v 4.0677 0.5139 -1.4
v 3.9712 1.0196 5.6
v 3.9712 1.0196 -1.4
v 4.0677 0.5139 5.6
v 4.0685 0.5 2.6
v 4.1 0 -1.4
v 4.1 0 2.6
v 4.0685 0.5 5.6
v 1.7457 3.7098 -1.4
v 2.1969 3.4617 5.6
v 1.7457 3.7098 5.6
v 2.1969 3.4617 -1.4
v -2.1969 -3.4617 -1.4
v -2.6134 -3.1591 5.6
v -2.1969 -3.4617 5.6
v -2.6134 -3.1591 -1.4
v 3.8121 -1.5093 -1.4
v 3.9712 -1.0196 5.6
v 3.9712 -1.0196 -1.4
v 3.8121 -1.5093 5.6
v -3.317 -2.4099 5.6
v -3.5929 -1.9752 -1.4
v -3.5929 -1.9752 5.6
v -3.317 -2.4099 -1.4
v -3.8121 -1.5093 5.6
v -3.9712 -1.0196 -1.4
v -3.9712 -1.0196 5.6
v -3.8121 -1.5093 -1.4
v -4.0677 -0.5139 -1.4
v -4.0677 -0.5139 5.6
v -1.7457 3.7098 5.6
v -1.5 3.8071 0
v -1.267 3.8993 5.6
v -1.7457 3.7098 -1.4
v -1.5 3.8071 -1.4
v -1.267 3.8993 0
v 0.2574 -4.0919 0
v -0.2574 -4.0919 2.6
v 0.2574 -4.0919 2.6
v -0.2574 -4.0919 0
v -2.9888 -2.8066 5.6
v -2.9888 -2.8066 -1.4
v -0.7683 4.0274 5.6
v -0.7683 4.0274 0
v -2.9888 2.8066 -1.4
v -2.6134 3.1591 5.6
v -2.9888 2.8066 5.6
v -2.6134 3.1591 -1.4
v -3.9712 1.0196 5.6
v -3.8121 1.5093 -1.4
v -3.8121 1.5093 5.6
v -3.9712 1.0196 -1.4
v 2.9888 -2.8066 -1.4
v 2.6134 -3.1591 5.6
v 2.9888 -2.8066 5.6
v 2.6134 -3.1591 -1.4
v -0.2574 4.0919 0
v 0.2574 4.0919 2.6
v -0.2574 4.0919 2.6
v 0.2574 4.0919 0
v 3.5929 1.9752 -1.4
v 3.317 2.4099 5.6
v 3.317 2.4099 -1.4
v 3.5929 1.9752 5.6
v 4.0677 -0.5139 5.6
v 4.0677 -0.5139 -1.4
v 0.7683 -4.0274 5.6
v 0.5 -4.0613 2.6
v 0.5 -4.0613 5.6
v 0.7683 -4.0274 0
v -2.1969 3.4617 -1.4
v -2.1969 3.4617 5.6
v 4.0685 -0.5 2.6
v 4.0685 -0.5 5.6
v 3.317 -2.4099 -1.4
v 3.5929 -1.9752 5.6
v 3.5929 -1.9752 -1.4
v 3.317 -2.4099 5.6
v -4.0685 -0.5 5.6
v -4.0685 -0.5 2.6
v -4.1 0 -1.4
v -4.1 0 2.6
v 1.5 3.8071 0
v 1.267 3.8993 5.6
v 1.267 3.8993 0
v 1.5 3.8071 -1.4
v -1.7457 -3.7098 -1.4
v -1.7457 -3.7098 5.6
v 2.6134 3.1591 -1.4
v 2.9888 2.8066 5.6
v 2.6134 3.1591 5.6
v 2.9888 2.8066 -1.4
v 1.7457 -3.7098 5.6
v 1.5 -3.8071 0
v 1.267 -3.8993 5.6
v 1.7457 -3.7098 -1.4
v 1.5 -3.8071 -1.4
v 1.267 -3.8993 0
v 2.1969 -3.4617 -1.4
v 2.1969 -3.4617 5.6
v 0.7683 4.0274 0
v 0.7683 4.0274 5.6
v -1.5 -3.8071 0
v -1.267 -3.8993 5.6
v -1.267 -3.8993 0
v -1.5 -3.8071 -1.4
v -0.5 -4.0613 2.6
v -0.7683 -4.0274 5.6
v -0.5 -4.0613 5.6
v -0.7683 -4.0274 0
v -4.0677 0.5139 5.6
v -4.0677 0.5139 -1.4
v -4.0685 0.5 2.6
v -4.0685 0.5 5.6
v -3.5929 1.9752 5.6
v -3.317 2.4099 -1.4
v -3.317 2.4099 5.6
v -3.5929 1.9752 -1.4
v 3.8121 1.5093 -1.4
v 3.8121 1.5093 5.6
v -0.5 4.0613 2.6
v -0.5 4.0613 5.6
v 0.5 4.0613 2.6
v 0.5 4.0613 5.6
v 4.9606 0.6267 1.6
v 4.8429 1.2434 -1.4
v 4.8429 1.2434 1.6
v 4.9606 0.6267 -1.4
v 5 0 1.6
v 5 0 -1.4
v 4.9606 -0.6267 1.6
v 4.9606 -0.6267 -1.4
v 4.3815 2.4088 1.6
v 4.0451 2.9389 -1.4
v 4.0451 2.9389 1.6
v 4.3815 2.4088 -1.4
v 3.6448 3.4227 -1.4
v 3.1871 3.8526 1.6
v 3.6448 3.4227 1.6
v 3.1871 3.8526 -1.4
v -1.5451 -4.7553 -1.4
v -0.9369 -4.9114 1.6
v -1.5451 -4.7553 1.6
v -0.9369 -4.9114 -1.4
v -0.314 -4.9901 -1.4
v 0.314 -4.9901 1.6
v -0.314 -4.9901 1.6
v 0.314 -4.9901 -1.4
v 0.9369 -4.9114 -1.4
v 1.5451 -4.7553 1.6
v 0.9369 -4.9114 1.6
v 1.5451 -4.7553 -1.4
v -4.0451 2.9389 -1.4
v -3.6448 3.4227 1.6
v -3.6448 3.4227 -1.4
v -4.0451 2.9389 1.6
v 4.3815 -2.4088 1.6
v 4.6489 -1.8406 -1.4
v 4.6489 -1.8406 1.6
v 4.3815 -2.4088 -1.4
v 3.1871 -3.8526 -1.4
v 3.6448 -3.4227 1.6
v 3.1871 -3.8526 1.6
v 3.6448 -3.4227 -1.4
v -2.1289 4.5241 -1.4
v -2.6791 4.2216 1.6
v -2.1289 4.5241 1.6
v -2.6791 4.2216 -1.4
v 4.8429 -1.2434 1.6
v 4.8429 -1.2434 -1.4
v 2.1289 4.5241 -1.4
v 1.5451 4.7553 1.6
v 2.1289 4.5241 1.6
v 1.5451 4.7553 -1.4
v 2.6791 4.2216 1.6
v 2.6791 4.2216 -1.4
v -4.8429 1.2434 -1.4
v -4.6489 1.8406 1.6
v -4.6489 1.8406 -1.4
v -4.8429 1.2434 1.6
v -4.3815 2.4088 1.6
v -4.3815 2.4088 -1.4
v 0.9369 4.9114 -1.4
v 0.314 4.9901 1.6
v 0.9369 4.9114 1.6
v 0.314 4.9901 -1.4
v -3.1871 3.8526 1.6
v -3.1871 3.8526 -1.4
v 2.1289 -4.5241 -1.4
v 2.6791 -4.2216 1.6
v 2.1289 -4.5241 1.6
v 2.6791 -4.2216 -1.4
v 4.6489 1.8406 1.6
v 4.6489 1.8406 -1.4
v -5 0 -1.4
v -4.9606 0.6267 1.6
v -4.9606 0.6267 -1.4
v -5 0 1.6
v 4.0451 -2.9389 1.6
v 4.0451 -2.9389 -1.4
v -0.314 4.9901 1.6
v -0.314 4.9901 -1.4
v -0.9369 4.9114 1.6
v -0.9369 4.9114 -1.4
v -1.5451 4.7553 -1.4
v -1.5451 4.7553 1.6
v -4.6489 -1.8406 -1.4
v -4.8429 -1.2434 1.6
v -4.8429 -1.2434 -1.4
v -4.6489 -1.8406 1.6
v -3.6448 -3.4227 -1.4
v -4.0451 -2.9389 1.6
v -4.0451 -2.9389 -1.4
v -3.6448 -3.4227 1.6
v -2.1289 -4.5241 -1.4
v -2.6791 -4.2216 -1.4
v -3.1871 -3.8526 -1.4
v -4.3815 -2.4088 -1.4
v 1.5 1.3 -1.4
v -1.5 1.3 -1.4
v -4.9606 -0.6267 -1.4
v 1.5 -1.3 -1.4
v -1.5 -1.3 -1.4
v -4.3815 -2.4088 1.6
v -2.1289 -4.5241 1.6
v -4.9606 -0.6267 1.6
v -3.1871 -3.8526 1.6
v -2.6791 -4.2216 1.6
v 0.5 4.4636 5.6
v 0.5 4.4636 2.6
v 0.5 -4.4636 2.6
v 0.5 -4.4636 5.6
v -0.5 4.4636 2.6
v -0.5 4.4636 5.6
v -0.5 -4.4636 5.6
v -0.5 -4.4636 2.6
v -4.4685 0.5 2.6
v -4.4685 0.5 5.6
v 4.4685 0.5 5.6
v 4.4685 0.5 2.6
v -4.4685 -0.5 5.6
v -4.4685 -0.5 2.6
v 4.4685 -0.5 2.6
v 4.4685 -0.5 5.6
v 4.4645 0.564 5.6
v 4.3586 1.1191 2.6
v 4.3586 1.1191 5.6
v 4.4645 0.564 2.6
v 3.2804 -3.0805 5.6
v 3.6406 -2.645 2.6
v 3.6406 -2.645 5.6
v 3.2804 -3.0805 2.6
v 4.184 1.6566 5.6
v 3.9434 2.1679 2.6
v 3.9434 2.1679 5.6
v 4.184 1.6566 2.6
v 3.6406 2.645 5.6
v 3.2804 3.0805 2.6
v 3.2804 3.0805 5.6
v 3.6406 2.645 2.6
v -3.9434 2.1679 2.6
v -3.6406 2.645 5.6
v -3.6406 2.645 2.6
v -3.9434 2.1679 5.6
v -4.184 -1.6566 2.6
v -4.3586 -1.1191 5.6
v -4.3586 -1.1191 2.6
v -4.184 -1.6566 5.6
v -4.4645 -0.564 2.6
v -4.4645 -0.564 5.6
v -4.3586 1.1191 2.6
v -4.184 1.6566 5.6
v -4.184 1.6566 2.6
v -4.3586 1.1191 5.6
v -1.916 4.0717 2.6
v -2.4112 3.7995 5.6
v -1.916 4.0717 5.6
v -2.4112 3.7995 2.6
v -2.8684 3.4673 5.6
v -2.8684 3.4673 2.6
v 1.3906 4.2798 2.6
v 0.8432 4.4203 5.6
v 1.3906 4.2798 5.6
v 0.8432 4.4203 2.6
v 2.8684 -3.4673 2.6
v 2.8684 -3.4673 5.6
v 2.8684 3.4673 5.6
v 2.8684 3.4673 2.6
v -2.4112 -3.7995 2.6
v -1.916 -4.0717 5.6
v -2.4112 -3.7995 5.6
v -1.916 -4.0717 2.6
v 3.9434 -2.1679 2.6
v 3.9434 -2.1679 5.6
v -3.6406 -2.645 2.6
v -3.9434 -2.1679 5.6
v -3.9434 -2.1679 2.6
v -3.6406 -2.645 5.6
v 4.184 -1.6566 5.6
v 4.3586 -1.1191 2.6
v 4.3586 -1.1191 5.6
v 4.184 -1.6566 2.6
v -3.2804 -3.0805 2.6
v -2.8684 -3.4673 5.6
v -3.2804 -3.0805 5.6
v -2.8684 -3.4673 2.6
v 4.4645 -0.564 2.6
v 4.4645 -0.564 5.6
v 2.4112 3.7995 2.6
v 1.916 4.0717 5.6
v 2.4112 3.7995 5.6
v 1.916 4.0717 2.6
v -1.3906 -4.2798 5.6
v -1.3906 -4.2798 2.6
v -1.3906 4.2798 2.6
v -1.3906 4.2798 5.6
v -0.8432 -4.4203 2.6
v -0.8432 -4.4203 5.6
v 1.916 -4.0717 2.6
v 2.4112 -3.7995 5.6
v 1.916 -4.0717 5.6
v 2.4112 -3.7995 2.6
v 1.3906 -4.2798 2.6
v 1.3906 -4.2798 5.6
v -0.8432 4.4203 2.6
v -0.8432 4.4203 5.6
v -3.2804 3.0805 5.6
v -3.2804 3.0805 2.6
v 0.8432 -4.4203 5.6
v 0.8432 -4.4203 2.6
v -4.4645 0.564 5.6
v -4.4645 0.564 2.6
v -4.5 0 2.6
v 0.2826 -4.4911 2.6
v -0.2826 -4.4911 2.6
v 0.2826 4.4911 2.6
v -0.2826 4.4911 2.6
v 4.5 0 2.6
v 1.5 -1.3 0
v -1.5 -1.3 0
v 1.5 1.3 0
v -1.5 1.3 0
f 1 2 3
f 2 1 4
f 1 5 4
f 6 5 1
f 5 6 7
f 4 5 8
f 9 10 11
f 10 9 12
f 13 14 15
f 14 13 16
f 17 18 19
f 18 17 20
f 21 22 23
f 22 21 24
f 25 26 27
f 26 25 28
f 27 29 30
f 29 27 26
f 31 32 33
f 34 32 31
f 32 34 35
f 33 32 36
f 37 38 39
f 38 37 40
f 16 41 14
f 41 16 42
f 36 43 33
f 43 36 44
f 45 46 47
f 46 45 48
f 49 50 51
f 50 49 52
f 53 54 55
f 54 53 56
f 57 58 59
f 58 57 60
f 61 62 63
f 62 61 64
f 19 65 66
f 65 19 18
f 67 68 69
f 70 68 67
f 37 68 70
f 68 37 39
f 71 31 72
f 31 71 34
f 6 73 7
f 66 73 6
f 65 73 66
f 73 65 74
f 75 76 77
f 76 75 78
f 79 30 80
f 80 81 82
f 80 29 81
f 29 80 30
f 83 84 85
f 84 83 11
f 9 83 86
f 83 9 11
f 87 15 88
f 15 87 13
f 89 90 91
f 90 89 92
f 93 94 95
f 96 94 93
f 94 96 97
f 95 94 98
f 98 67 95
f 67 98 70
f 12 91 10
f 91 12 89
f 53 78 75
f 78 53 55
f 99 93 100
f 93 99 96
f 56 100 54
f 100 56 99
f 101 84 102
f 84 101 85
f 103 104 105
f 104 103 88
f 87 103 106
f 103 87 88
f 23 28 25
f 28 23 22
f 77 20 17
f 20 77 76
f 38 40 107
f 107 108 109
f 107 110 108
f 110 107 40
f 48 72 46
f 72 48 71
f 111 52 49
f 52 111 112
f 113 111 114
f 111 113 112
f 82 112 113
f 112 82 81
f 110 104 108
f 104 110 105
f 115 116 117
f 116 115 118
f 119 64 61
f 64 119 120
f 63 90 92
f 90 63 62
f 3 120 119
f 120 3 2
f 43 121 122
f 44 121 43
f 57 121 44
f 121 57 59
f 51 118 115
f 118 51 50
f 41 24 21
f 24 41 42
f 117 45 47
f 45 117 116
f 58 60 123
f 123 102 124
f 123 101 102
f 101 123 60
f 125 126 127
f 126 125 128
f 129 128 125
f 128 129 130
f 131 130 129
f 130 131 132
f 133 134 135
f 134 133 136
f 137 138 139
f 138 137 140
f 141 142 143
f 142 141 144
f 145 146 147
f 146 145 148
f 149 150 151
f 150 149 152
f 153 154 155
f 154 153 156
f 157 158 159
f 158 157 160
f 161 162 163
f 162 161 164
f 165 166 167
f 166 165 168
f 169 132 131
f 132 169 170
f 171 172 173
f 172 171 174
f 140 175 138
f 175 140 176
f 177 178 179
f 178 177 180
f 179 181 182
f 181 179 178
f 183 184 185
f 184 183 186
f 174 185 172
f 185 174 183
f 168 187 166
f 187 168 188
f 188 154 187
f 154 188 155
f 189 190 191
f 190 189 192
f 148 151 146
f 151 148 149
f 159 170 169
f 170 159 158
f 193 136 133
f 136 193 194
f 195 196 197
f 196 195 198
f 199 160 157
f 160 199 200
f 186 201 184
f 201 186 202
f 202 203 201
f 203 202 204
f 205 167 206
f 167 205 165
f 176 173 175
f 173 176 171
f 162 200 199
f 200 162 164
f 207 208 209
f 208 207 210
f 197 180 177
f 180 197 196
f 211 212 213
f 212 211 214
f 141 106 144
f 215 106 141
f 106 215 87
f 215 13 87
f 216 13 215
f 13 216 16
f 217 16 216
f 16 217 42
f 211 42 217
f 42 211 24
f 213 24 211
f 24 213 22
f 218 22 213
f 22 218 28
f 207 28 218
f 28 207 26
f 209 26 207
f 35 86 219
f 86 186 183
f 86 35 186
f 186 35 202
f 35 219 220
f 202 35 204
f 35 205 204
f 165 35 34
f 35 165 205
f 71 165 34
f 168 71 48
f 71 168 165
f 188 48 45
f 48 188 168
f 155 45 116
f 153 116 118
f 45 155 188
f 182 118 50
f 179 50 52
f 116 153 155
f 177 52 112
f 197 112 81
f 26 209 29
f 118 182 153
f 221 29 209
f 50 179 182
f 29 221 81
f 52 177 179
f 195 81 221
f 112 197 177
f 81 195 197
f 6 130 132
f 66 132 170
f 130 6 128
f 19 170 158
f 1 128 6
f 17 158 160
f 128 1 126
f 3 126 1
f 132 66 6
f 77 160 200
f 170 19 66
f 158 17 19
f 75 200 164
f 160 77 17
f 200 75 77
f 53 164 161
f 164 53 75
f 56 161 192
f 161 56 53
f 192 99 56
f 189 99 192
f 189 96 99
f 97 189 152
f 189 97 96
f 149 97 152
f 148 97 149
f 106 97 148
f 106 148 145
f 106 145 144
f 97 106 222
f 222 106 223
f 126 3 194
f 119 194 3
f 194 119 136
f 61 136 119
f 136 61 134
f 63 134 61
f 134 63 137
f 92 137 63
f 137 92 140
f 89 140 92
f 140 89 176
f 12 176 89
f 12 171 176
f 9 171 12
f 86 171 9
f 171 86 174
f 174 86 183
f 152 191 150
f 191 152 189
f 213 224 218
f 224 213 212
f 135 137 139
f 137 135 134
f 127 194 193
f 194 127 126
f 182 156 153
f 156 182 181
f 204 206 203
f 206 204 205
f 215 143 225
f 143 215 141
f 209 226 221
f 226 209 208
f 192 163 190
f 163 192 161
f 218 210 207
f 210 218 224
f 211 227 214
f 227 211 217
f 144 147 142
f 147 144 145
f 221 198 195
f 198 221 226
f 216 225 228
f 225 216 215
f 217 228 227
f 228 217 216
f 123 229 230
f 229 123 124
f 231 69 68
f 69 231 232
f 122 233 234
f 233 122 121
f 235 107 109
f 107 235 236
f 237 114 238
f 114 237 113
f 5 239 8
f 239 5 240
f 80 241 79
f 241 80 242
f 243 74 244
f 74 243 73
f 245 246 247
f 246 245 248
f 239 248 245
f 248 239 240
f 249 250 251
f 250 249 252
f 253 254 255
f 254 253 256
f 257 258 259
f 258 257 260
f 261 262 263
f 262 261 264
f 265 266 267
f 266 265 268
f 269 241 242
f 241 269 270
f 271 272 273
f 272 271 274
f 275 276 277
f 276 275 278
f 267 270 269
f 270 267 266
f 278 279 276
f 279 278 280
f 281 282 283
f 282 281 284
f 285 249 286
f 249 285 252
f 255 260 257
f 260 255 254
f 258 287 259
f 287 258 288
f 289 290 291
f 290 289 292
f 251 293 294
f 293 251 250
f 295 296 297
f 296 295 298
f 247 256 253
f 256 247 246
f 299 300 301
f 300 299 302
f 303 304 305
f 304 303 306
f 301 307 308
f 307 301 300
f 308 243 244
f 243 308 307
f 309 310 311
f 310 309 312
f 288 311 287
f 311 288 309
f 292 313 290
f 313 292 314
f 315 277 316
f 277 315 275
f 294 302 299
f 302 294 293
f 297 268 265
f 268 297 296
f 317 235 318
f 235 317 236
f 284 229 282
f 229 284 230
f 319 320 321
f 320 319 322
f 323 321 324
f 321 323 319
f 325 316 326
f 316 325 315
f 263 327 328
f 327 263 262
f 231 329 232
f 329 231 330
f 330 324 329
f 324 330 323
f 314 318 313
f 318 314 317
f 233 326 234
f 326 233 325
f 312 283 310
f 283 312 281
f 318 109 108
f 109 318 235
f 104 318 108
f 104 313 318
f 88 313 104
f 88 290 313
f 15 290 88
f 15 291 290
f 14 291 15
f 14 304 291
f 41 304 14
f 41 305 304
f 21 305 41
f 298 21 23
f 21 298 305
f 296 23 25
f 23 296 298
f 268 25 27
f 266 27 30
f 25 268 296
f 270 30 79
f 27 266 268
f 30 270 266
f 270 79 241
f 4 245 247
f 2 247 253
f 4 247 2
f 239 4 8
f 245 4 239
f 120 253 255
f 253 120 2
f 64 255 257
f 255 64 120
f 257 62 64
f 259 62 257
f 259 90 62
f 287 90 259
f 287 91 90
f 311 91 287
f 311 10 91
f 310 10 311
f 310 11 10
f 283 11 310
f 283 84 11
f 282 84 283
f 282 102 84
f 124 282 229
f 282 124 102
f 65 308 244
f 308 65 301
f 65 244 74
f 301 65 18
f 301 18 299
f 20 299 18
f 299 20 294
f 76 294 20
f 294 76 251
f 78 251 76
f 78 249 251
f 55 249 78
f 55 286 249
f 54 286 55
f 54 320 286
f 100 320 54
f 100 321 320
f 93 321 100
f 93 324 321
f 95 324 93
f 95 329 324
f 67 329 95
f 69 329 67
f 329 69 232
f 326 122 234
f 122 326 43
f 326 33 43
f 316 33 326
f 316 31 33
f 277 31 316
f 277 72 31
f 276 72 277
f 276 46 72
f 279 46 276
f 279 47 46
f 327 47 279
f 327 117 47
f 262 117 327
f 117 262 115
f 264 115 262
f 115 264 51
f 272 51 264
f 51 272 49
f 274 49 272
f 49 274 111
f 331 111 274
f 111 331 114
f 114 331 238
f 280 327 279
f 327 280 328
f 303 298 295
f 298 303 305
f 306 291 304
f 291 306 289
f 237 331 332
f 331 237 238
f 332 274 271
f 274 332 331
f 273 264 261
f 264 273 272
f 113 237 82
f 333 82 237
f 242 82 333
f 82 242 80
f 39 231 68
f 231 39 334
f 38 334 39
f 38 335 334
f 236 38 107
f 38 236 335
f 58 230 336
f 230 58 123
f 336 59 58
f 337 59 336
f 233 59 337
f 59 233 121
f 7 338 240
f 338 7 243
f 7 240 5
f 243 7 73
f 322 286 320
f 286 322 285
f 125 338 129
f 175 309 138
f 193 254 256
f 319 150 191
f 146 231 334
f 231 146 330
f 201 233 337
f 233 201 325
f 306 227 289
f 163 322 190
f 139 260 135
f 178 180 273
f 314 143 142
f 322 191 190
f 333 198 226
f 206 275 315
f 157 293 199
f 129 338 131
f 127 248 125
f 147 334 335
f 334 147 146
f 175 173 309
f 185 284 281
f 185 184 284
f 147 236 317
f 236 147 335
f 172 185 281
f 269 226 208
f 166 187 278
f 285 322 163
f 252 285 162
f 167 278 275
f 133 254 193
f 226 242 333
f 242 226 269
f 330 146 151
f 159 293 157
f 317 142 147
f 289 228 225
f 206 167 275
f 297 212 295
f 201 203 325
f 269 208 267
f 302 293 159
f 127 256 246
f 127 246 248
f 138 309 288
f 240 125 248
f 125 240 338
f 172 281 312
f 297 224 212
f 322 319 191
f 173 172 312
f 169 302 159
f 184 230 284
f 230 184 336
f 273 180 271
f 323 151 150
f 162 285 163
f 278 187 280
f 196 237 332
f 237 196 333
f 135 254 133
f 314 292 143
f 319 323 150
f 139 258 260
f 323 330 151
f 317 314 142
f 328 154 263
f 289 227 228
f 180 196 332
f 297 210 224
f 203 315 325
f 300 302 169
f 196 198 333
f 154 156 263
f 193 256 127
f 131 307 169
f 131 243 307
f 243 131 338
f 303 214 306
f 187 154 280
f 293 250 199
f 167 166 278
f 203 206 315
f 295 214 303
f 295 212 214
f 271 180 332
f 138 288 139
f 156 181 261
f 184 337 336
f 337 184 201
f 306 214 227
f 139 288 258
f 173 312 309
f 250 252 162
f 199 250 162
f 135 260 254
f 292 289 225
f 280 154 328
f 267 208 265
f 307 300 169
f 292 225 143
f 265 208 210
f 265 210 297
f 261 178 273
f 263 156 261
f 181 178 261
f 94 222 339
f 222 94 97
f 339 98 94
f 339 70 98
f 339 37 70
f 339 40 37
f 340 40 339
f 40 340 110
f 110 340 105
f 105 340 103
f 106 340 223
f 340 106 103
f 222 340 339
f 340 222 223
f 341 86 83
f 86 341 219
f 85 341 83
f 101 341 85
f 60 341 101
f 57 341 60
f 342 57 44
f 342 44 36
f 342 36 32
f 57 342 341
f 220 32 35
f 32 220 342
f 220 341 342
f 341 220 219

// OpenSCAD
motor_d = 8;
motor_l = 20;

ring_wall_t = 2;
ring_h      = 3;
ring2_h     = 4;
base_beam_h = 1.4;
$fn=50;

module motor() {
    translate([0,0,-0.01]) color("red", 0.25) cylinder(d=motor_d+0.2, h=motor_l);
    translate([0,0,motor_l]) {
        color("grey", 0.25) cylinder(d=1, h=4);
        color("orange", "0.25") cylinder(d=3, h=0.5);
    }
}

module base_ring() {
    difference() {
        cylinder(d=motor_d + ring_wall_t, h=ring_h);
        motor();
    }
}

module top_ring() {
    d = motor_d + ring_wall_t/2;
    neck_h = ring2_h/4;
    h      =  ring2_h - neck_h;
    slot   = 1;
    difference() {
        union() {
            translate([0,0,ring_h]) cylinder(d1=motor_d + ring_wall_t, d2=d, h=neck_h);
            translate([0,0,ring_h+neck_h]) {
                difference() {
                    cylinder(d=d, h=h);
                    translate([0,0,h/2]) {
                        cube([slot,d+0.01,h+0.01], center=true);
                        cube([d+0.01,slot,h+0.01], center=true);
                    }
                }
            }
        }
        motor();
        
    }   
}

module base_beam() {
    base_beam_x = 3;
    base_beam_y = motor_d/2.5;
    y_off = (motor_d+ring_wall_t)/2 - 0.5;
    for(y=[-y_off, y_off-base_beam_y]) {
        translate([-base_beam_x/2, y,0]) 
            cube([base_beam_x, base_beam_y, base_beam_h]);
    }
}

module holder() {
    translate([0,0,-base_beam_h]) {
        base_ring();
        top_ring();
        base_beam();
    }
    
}

% motor();
holder();
